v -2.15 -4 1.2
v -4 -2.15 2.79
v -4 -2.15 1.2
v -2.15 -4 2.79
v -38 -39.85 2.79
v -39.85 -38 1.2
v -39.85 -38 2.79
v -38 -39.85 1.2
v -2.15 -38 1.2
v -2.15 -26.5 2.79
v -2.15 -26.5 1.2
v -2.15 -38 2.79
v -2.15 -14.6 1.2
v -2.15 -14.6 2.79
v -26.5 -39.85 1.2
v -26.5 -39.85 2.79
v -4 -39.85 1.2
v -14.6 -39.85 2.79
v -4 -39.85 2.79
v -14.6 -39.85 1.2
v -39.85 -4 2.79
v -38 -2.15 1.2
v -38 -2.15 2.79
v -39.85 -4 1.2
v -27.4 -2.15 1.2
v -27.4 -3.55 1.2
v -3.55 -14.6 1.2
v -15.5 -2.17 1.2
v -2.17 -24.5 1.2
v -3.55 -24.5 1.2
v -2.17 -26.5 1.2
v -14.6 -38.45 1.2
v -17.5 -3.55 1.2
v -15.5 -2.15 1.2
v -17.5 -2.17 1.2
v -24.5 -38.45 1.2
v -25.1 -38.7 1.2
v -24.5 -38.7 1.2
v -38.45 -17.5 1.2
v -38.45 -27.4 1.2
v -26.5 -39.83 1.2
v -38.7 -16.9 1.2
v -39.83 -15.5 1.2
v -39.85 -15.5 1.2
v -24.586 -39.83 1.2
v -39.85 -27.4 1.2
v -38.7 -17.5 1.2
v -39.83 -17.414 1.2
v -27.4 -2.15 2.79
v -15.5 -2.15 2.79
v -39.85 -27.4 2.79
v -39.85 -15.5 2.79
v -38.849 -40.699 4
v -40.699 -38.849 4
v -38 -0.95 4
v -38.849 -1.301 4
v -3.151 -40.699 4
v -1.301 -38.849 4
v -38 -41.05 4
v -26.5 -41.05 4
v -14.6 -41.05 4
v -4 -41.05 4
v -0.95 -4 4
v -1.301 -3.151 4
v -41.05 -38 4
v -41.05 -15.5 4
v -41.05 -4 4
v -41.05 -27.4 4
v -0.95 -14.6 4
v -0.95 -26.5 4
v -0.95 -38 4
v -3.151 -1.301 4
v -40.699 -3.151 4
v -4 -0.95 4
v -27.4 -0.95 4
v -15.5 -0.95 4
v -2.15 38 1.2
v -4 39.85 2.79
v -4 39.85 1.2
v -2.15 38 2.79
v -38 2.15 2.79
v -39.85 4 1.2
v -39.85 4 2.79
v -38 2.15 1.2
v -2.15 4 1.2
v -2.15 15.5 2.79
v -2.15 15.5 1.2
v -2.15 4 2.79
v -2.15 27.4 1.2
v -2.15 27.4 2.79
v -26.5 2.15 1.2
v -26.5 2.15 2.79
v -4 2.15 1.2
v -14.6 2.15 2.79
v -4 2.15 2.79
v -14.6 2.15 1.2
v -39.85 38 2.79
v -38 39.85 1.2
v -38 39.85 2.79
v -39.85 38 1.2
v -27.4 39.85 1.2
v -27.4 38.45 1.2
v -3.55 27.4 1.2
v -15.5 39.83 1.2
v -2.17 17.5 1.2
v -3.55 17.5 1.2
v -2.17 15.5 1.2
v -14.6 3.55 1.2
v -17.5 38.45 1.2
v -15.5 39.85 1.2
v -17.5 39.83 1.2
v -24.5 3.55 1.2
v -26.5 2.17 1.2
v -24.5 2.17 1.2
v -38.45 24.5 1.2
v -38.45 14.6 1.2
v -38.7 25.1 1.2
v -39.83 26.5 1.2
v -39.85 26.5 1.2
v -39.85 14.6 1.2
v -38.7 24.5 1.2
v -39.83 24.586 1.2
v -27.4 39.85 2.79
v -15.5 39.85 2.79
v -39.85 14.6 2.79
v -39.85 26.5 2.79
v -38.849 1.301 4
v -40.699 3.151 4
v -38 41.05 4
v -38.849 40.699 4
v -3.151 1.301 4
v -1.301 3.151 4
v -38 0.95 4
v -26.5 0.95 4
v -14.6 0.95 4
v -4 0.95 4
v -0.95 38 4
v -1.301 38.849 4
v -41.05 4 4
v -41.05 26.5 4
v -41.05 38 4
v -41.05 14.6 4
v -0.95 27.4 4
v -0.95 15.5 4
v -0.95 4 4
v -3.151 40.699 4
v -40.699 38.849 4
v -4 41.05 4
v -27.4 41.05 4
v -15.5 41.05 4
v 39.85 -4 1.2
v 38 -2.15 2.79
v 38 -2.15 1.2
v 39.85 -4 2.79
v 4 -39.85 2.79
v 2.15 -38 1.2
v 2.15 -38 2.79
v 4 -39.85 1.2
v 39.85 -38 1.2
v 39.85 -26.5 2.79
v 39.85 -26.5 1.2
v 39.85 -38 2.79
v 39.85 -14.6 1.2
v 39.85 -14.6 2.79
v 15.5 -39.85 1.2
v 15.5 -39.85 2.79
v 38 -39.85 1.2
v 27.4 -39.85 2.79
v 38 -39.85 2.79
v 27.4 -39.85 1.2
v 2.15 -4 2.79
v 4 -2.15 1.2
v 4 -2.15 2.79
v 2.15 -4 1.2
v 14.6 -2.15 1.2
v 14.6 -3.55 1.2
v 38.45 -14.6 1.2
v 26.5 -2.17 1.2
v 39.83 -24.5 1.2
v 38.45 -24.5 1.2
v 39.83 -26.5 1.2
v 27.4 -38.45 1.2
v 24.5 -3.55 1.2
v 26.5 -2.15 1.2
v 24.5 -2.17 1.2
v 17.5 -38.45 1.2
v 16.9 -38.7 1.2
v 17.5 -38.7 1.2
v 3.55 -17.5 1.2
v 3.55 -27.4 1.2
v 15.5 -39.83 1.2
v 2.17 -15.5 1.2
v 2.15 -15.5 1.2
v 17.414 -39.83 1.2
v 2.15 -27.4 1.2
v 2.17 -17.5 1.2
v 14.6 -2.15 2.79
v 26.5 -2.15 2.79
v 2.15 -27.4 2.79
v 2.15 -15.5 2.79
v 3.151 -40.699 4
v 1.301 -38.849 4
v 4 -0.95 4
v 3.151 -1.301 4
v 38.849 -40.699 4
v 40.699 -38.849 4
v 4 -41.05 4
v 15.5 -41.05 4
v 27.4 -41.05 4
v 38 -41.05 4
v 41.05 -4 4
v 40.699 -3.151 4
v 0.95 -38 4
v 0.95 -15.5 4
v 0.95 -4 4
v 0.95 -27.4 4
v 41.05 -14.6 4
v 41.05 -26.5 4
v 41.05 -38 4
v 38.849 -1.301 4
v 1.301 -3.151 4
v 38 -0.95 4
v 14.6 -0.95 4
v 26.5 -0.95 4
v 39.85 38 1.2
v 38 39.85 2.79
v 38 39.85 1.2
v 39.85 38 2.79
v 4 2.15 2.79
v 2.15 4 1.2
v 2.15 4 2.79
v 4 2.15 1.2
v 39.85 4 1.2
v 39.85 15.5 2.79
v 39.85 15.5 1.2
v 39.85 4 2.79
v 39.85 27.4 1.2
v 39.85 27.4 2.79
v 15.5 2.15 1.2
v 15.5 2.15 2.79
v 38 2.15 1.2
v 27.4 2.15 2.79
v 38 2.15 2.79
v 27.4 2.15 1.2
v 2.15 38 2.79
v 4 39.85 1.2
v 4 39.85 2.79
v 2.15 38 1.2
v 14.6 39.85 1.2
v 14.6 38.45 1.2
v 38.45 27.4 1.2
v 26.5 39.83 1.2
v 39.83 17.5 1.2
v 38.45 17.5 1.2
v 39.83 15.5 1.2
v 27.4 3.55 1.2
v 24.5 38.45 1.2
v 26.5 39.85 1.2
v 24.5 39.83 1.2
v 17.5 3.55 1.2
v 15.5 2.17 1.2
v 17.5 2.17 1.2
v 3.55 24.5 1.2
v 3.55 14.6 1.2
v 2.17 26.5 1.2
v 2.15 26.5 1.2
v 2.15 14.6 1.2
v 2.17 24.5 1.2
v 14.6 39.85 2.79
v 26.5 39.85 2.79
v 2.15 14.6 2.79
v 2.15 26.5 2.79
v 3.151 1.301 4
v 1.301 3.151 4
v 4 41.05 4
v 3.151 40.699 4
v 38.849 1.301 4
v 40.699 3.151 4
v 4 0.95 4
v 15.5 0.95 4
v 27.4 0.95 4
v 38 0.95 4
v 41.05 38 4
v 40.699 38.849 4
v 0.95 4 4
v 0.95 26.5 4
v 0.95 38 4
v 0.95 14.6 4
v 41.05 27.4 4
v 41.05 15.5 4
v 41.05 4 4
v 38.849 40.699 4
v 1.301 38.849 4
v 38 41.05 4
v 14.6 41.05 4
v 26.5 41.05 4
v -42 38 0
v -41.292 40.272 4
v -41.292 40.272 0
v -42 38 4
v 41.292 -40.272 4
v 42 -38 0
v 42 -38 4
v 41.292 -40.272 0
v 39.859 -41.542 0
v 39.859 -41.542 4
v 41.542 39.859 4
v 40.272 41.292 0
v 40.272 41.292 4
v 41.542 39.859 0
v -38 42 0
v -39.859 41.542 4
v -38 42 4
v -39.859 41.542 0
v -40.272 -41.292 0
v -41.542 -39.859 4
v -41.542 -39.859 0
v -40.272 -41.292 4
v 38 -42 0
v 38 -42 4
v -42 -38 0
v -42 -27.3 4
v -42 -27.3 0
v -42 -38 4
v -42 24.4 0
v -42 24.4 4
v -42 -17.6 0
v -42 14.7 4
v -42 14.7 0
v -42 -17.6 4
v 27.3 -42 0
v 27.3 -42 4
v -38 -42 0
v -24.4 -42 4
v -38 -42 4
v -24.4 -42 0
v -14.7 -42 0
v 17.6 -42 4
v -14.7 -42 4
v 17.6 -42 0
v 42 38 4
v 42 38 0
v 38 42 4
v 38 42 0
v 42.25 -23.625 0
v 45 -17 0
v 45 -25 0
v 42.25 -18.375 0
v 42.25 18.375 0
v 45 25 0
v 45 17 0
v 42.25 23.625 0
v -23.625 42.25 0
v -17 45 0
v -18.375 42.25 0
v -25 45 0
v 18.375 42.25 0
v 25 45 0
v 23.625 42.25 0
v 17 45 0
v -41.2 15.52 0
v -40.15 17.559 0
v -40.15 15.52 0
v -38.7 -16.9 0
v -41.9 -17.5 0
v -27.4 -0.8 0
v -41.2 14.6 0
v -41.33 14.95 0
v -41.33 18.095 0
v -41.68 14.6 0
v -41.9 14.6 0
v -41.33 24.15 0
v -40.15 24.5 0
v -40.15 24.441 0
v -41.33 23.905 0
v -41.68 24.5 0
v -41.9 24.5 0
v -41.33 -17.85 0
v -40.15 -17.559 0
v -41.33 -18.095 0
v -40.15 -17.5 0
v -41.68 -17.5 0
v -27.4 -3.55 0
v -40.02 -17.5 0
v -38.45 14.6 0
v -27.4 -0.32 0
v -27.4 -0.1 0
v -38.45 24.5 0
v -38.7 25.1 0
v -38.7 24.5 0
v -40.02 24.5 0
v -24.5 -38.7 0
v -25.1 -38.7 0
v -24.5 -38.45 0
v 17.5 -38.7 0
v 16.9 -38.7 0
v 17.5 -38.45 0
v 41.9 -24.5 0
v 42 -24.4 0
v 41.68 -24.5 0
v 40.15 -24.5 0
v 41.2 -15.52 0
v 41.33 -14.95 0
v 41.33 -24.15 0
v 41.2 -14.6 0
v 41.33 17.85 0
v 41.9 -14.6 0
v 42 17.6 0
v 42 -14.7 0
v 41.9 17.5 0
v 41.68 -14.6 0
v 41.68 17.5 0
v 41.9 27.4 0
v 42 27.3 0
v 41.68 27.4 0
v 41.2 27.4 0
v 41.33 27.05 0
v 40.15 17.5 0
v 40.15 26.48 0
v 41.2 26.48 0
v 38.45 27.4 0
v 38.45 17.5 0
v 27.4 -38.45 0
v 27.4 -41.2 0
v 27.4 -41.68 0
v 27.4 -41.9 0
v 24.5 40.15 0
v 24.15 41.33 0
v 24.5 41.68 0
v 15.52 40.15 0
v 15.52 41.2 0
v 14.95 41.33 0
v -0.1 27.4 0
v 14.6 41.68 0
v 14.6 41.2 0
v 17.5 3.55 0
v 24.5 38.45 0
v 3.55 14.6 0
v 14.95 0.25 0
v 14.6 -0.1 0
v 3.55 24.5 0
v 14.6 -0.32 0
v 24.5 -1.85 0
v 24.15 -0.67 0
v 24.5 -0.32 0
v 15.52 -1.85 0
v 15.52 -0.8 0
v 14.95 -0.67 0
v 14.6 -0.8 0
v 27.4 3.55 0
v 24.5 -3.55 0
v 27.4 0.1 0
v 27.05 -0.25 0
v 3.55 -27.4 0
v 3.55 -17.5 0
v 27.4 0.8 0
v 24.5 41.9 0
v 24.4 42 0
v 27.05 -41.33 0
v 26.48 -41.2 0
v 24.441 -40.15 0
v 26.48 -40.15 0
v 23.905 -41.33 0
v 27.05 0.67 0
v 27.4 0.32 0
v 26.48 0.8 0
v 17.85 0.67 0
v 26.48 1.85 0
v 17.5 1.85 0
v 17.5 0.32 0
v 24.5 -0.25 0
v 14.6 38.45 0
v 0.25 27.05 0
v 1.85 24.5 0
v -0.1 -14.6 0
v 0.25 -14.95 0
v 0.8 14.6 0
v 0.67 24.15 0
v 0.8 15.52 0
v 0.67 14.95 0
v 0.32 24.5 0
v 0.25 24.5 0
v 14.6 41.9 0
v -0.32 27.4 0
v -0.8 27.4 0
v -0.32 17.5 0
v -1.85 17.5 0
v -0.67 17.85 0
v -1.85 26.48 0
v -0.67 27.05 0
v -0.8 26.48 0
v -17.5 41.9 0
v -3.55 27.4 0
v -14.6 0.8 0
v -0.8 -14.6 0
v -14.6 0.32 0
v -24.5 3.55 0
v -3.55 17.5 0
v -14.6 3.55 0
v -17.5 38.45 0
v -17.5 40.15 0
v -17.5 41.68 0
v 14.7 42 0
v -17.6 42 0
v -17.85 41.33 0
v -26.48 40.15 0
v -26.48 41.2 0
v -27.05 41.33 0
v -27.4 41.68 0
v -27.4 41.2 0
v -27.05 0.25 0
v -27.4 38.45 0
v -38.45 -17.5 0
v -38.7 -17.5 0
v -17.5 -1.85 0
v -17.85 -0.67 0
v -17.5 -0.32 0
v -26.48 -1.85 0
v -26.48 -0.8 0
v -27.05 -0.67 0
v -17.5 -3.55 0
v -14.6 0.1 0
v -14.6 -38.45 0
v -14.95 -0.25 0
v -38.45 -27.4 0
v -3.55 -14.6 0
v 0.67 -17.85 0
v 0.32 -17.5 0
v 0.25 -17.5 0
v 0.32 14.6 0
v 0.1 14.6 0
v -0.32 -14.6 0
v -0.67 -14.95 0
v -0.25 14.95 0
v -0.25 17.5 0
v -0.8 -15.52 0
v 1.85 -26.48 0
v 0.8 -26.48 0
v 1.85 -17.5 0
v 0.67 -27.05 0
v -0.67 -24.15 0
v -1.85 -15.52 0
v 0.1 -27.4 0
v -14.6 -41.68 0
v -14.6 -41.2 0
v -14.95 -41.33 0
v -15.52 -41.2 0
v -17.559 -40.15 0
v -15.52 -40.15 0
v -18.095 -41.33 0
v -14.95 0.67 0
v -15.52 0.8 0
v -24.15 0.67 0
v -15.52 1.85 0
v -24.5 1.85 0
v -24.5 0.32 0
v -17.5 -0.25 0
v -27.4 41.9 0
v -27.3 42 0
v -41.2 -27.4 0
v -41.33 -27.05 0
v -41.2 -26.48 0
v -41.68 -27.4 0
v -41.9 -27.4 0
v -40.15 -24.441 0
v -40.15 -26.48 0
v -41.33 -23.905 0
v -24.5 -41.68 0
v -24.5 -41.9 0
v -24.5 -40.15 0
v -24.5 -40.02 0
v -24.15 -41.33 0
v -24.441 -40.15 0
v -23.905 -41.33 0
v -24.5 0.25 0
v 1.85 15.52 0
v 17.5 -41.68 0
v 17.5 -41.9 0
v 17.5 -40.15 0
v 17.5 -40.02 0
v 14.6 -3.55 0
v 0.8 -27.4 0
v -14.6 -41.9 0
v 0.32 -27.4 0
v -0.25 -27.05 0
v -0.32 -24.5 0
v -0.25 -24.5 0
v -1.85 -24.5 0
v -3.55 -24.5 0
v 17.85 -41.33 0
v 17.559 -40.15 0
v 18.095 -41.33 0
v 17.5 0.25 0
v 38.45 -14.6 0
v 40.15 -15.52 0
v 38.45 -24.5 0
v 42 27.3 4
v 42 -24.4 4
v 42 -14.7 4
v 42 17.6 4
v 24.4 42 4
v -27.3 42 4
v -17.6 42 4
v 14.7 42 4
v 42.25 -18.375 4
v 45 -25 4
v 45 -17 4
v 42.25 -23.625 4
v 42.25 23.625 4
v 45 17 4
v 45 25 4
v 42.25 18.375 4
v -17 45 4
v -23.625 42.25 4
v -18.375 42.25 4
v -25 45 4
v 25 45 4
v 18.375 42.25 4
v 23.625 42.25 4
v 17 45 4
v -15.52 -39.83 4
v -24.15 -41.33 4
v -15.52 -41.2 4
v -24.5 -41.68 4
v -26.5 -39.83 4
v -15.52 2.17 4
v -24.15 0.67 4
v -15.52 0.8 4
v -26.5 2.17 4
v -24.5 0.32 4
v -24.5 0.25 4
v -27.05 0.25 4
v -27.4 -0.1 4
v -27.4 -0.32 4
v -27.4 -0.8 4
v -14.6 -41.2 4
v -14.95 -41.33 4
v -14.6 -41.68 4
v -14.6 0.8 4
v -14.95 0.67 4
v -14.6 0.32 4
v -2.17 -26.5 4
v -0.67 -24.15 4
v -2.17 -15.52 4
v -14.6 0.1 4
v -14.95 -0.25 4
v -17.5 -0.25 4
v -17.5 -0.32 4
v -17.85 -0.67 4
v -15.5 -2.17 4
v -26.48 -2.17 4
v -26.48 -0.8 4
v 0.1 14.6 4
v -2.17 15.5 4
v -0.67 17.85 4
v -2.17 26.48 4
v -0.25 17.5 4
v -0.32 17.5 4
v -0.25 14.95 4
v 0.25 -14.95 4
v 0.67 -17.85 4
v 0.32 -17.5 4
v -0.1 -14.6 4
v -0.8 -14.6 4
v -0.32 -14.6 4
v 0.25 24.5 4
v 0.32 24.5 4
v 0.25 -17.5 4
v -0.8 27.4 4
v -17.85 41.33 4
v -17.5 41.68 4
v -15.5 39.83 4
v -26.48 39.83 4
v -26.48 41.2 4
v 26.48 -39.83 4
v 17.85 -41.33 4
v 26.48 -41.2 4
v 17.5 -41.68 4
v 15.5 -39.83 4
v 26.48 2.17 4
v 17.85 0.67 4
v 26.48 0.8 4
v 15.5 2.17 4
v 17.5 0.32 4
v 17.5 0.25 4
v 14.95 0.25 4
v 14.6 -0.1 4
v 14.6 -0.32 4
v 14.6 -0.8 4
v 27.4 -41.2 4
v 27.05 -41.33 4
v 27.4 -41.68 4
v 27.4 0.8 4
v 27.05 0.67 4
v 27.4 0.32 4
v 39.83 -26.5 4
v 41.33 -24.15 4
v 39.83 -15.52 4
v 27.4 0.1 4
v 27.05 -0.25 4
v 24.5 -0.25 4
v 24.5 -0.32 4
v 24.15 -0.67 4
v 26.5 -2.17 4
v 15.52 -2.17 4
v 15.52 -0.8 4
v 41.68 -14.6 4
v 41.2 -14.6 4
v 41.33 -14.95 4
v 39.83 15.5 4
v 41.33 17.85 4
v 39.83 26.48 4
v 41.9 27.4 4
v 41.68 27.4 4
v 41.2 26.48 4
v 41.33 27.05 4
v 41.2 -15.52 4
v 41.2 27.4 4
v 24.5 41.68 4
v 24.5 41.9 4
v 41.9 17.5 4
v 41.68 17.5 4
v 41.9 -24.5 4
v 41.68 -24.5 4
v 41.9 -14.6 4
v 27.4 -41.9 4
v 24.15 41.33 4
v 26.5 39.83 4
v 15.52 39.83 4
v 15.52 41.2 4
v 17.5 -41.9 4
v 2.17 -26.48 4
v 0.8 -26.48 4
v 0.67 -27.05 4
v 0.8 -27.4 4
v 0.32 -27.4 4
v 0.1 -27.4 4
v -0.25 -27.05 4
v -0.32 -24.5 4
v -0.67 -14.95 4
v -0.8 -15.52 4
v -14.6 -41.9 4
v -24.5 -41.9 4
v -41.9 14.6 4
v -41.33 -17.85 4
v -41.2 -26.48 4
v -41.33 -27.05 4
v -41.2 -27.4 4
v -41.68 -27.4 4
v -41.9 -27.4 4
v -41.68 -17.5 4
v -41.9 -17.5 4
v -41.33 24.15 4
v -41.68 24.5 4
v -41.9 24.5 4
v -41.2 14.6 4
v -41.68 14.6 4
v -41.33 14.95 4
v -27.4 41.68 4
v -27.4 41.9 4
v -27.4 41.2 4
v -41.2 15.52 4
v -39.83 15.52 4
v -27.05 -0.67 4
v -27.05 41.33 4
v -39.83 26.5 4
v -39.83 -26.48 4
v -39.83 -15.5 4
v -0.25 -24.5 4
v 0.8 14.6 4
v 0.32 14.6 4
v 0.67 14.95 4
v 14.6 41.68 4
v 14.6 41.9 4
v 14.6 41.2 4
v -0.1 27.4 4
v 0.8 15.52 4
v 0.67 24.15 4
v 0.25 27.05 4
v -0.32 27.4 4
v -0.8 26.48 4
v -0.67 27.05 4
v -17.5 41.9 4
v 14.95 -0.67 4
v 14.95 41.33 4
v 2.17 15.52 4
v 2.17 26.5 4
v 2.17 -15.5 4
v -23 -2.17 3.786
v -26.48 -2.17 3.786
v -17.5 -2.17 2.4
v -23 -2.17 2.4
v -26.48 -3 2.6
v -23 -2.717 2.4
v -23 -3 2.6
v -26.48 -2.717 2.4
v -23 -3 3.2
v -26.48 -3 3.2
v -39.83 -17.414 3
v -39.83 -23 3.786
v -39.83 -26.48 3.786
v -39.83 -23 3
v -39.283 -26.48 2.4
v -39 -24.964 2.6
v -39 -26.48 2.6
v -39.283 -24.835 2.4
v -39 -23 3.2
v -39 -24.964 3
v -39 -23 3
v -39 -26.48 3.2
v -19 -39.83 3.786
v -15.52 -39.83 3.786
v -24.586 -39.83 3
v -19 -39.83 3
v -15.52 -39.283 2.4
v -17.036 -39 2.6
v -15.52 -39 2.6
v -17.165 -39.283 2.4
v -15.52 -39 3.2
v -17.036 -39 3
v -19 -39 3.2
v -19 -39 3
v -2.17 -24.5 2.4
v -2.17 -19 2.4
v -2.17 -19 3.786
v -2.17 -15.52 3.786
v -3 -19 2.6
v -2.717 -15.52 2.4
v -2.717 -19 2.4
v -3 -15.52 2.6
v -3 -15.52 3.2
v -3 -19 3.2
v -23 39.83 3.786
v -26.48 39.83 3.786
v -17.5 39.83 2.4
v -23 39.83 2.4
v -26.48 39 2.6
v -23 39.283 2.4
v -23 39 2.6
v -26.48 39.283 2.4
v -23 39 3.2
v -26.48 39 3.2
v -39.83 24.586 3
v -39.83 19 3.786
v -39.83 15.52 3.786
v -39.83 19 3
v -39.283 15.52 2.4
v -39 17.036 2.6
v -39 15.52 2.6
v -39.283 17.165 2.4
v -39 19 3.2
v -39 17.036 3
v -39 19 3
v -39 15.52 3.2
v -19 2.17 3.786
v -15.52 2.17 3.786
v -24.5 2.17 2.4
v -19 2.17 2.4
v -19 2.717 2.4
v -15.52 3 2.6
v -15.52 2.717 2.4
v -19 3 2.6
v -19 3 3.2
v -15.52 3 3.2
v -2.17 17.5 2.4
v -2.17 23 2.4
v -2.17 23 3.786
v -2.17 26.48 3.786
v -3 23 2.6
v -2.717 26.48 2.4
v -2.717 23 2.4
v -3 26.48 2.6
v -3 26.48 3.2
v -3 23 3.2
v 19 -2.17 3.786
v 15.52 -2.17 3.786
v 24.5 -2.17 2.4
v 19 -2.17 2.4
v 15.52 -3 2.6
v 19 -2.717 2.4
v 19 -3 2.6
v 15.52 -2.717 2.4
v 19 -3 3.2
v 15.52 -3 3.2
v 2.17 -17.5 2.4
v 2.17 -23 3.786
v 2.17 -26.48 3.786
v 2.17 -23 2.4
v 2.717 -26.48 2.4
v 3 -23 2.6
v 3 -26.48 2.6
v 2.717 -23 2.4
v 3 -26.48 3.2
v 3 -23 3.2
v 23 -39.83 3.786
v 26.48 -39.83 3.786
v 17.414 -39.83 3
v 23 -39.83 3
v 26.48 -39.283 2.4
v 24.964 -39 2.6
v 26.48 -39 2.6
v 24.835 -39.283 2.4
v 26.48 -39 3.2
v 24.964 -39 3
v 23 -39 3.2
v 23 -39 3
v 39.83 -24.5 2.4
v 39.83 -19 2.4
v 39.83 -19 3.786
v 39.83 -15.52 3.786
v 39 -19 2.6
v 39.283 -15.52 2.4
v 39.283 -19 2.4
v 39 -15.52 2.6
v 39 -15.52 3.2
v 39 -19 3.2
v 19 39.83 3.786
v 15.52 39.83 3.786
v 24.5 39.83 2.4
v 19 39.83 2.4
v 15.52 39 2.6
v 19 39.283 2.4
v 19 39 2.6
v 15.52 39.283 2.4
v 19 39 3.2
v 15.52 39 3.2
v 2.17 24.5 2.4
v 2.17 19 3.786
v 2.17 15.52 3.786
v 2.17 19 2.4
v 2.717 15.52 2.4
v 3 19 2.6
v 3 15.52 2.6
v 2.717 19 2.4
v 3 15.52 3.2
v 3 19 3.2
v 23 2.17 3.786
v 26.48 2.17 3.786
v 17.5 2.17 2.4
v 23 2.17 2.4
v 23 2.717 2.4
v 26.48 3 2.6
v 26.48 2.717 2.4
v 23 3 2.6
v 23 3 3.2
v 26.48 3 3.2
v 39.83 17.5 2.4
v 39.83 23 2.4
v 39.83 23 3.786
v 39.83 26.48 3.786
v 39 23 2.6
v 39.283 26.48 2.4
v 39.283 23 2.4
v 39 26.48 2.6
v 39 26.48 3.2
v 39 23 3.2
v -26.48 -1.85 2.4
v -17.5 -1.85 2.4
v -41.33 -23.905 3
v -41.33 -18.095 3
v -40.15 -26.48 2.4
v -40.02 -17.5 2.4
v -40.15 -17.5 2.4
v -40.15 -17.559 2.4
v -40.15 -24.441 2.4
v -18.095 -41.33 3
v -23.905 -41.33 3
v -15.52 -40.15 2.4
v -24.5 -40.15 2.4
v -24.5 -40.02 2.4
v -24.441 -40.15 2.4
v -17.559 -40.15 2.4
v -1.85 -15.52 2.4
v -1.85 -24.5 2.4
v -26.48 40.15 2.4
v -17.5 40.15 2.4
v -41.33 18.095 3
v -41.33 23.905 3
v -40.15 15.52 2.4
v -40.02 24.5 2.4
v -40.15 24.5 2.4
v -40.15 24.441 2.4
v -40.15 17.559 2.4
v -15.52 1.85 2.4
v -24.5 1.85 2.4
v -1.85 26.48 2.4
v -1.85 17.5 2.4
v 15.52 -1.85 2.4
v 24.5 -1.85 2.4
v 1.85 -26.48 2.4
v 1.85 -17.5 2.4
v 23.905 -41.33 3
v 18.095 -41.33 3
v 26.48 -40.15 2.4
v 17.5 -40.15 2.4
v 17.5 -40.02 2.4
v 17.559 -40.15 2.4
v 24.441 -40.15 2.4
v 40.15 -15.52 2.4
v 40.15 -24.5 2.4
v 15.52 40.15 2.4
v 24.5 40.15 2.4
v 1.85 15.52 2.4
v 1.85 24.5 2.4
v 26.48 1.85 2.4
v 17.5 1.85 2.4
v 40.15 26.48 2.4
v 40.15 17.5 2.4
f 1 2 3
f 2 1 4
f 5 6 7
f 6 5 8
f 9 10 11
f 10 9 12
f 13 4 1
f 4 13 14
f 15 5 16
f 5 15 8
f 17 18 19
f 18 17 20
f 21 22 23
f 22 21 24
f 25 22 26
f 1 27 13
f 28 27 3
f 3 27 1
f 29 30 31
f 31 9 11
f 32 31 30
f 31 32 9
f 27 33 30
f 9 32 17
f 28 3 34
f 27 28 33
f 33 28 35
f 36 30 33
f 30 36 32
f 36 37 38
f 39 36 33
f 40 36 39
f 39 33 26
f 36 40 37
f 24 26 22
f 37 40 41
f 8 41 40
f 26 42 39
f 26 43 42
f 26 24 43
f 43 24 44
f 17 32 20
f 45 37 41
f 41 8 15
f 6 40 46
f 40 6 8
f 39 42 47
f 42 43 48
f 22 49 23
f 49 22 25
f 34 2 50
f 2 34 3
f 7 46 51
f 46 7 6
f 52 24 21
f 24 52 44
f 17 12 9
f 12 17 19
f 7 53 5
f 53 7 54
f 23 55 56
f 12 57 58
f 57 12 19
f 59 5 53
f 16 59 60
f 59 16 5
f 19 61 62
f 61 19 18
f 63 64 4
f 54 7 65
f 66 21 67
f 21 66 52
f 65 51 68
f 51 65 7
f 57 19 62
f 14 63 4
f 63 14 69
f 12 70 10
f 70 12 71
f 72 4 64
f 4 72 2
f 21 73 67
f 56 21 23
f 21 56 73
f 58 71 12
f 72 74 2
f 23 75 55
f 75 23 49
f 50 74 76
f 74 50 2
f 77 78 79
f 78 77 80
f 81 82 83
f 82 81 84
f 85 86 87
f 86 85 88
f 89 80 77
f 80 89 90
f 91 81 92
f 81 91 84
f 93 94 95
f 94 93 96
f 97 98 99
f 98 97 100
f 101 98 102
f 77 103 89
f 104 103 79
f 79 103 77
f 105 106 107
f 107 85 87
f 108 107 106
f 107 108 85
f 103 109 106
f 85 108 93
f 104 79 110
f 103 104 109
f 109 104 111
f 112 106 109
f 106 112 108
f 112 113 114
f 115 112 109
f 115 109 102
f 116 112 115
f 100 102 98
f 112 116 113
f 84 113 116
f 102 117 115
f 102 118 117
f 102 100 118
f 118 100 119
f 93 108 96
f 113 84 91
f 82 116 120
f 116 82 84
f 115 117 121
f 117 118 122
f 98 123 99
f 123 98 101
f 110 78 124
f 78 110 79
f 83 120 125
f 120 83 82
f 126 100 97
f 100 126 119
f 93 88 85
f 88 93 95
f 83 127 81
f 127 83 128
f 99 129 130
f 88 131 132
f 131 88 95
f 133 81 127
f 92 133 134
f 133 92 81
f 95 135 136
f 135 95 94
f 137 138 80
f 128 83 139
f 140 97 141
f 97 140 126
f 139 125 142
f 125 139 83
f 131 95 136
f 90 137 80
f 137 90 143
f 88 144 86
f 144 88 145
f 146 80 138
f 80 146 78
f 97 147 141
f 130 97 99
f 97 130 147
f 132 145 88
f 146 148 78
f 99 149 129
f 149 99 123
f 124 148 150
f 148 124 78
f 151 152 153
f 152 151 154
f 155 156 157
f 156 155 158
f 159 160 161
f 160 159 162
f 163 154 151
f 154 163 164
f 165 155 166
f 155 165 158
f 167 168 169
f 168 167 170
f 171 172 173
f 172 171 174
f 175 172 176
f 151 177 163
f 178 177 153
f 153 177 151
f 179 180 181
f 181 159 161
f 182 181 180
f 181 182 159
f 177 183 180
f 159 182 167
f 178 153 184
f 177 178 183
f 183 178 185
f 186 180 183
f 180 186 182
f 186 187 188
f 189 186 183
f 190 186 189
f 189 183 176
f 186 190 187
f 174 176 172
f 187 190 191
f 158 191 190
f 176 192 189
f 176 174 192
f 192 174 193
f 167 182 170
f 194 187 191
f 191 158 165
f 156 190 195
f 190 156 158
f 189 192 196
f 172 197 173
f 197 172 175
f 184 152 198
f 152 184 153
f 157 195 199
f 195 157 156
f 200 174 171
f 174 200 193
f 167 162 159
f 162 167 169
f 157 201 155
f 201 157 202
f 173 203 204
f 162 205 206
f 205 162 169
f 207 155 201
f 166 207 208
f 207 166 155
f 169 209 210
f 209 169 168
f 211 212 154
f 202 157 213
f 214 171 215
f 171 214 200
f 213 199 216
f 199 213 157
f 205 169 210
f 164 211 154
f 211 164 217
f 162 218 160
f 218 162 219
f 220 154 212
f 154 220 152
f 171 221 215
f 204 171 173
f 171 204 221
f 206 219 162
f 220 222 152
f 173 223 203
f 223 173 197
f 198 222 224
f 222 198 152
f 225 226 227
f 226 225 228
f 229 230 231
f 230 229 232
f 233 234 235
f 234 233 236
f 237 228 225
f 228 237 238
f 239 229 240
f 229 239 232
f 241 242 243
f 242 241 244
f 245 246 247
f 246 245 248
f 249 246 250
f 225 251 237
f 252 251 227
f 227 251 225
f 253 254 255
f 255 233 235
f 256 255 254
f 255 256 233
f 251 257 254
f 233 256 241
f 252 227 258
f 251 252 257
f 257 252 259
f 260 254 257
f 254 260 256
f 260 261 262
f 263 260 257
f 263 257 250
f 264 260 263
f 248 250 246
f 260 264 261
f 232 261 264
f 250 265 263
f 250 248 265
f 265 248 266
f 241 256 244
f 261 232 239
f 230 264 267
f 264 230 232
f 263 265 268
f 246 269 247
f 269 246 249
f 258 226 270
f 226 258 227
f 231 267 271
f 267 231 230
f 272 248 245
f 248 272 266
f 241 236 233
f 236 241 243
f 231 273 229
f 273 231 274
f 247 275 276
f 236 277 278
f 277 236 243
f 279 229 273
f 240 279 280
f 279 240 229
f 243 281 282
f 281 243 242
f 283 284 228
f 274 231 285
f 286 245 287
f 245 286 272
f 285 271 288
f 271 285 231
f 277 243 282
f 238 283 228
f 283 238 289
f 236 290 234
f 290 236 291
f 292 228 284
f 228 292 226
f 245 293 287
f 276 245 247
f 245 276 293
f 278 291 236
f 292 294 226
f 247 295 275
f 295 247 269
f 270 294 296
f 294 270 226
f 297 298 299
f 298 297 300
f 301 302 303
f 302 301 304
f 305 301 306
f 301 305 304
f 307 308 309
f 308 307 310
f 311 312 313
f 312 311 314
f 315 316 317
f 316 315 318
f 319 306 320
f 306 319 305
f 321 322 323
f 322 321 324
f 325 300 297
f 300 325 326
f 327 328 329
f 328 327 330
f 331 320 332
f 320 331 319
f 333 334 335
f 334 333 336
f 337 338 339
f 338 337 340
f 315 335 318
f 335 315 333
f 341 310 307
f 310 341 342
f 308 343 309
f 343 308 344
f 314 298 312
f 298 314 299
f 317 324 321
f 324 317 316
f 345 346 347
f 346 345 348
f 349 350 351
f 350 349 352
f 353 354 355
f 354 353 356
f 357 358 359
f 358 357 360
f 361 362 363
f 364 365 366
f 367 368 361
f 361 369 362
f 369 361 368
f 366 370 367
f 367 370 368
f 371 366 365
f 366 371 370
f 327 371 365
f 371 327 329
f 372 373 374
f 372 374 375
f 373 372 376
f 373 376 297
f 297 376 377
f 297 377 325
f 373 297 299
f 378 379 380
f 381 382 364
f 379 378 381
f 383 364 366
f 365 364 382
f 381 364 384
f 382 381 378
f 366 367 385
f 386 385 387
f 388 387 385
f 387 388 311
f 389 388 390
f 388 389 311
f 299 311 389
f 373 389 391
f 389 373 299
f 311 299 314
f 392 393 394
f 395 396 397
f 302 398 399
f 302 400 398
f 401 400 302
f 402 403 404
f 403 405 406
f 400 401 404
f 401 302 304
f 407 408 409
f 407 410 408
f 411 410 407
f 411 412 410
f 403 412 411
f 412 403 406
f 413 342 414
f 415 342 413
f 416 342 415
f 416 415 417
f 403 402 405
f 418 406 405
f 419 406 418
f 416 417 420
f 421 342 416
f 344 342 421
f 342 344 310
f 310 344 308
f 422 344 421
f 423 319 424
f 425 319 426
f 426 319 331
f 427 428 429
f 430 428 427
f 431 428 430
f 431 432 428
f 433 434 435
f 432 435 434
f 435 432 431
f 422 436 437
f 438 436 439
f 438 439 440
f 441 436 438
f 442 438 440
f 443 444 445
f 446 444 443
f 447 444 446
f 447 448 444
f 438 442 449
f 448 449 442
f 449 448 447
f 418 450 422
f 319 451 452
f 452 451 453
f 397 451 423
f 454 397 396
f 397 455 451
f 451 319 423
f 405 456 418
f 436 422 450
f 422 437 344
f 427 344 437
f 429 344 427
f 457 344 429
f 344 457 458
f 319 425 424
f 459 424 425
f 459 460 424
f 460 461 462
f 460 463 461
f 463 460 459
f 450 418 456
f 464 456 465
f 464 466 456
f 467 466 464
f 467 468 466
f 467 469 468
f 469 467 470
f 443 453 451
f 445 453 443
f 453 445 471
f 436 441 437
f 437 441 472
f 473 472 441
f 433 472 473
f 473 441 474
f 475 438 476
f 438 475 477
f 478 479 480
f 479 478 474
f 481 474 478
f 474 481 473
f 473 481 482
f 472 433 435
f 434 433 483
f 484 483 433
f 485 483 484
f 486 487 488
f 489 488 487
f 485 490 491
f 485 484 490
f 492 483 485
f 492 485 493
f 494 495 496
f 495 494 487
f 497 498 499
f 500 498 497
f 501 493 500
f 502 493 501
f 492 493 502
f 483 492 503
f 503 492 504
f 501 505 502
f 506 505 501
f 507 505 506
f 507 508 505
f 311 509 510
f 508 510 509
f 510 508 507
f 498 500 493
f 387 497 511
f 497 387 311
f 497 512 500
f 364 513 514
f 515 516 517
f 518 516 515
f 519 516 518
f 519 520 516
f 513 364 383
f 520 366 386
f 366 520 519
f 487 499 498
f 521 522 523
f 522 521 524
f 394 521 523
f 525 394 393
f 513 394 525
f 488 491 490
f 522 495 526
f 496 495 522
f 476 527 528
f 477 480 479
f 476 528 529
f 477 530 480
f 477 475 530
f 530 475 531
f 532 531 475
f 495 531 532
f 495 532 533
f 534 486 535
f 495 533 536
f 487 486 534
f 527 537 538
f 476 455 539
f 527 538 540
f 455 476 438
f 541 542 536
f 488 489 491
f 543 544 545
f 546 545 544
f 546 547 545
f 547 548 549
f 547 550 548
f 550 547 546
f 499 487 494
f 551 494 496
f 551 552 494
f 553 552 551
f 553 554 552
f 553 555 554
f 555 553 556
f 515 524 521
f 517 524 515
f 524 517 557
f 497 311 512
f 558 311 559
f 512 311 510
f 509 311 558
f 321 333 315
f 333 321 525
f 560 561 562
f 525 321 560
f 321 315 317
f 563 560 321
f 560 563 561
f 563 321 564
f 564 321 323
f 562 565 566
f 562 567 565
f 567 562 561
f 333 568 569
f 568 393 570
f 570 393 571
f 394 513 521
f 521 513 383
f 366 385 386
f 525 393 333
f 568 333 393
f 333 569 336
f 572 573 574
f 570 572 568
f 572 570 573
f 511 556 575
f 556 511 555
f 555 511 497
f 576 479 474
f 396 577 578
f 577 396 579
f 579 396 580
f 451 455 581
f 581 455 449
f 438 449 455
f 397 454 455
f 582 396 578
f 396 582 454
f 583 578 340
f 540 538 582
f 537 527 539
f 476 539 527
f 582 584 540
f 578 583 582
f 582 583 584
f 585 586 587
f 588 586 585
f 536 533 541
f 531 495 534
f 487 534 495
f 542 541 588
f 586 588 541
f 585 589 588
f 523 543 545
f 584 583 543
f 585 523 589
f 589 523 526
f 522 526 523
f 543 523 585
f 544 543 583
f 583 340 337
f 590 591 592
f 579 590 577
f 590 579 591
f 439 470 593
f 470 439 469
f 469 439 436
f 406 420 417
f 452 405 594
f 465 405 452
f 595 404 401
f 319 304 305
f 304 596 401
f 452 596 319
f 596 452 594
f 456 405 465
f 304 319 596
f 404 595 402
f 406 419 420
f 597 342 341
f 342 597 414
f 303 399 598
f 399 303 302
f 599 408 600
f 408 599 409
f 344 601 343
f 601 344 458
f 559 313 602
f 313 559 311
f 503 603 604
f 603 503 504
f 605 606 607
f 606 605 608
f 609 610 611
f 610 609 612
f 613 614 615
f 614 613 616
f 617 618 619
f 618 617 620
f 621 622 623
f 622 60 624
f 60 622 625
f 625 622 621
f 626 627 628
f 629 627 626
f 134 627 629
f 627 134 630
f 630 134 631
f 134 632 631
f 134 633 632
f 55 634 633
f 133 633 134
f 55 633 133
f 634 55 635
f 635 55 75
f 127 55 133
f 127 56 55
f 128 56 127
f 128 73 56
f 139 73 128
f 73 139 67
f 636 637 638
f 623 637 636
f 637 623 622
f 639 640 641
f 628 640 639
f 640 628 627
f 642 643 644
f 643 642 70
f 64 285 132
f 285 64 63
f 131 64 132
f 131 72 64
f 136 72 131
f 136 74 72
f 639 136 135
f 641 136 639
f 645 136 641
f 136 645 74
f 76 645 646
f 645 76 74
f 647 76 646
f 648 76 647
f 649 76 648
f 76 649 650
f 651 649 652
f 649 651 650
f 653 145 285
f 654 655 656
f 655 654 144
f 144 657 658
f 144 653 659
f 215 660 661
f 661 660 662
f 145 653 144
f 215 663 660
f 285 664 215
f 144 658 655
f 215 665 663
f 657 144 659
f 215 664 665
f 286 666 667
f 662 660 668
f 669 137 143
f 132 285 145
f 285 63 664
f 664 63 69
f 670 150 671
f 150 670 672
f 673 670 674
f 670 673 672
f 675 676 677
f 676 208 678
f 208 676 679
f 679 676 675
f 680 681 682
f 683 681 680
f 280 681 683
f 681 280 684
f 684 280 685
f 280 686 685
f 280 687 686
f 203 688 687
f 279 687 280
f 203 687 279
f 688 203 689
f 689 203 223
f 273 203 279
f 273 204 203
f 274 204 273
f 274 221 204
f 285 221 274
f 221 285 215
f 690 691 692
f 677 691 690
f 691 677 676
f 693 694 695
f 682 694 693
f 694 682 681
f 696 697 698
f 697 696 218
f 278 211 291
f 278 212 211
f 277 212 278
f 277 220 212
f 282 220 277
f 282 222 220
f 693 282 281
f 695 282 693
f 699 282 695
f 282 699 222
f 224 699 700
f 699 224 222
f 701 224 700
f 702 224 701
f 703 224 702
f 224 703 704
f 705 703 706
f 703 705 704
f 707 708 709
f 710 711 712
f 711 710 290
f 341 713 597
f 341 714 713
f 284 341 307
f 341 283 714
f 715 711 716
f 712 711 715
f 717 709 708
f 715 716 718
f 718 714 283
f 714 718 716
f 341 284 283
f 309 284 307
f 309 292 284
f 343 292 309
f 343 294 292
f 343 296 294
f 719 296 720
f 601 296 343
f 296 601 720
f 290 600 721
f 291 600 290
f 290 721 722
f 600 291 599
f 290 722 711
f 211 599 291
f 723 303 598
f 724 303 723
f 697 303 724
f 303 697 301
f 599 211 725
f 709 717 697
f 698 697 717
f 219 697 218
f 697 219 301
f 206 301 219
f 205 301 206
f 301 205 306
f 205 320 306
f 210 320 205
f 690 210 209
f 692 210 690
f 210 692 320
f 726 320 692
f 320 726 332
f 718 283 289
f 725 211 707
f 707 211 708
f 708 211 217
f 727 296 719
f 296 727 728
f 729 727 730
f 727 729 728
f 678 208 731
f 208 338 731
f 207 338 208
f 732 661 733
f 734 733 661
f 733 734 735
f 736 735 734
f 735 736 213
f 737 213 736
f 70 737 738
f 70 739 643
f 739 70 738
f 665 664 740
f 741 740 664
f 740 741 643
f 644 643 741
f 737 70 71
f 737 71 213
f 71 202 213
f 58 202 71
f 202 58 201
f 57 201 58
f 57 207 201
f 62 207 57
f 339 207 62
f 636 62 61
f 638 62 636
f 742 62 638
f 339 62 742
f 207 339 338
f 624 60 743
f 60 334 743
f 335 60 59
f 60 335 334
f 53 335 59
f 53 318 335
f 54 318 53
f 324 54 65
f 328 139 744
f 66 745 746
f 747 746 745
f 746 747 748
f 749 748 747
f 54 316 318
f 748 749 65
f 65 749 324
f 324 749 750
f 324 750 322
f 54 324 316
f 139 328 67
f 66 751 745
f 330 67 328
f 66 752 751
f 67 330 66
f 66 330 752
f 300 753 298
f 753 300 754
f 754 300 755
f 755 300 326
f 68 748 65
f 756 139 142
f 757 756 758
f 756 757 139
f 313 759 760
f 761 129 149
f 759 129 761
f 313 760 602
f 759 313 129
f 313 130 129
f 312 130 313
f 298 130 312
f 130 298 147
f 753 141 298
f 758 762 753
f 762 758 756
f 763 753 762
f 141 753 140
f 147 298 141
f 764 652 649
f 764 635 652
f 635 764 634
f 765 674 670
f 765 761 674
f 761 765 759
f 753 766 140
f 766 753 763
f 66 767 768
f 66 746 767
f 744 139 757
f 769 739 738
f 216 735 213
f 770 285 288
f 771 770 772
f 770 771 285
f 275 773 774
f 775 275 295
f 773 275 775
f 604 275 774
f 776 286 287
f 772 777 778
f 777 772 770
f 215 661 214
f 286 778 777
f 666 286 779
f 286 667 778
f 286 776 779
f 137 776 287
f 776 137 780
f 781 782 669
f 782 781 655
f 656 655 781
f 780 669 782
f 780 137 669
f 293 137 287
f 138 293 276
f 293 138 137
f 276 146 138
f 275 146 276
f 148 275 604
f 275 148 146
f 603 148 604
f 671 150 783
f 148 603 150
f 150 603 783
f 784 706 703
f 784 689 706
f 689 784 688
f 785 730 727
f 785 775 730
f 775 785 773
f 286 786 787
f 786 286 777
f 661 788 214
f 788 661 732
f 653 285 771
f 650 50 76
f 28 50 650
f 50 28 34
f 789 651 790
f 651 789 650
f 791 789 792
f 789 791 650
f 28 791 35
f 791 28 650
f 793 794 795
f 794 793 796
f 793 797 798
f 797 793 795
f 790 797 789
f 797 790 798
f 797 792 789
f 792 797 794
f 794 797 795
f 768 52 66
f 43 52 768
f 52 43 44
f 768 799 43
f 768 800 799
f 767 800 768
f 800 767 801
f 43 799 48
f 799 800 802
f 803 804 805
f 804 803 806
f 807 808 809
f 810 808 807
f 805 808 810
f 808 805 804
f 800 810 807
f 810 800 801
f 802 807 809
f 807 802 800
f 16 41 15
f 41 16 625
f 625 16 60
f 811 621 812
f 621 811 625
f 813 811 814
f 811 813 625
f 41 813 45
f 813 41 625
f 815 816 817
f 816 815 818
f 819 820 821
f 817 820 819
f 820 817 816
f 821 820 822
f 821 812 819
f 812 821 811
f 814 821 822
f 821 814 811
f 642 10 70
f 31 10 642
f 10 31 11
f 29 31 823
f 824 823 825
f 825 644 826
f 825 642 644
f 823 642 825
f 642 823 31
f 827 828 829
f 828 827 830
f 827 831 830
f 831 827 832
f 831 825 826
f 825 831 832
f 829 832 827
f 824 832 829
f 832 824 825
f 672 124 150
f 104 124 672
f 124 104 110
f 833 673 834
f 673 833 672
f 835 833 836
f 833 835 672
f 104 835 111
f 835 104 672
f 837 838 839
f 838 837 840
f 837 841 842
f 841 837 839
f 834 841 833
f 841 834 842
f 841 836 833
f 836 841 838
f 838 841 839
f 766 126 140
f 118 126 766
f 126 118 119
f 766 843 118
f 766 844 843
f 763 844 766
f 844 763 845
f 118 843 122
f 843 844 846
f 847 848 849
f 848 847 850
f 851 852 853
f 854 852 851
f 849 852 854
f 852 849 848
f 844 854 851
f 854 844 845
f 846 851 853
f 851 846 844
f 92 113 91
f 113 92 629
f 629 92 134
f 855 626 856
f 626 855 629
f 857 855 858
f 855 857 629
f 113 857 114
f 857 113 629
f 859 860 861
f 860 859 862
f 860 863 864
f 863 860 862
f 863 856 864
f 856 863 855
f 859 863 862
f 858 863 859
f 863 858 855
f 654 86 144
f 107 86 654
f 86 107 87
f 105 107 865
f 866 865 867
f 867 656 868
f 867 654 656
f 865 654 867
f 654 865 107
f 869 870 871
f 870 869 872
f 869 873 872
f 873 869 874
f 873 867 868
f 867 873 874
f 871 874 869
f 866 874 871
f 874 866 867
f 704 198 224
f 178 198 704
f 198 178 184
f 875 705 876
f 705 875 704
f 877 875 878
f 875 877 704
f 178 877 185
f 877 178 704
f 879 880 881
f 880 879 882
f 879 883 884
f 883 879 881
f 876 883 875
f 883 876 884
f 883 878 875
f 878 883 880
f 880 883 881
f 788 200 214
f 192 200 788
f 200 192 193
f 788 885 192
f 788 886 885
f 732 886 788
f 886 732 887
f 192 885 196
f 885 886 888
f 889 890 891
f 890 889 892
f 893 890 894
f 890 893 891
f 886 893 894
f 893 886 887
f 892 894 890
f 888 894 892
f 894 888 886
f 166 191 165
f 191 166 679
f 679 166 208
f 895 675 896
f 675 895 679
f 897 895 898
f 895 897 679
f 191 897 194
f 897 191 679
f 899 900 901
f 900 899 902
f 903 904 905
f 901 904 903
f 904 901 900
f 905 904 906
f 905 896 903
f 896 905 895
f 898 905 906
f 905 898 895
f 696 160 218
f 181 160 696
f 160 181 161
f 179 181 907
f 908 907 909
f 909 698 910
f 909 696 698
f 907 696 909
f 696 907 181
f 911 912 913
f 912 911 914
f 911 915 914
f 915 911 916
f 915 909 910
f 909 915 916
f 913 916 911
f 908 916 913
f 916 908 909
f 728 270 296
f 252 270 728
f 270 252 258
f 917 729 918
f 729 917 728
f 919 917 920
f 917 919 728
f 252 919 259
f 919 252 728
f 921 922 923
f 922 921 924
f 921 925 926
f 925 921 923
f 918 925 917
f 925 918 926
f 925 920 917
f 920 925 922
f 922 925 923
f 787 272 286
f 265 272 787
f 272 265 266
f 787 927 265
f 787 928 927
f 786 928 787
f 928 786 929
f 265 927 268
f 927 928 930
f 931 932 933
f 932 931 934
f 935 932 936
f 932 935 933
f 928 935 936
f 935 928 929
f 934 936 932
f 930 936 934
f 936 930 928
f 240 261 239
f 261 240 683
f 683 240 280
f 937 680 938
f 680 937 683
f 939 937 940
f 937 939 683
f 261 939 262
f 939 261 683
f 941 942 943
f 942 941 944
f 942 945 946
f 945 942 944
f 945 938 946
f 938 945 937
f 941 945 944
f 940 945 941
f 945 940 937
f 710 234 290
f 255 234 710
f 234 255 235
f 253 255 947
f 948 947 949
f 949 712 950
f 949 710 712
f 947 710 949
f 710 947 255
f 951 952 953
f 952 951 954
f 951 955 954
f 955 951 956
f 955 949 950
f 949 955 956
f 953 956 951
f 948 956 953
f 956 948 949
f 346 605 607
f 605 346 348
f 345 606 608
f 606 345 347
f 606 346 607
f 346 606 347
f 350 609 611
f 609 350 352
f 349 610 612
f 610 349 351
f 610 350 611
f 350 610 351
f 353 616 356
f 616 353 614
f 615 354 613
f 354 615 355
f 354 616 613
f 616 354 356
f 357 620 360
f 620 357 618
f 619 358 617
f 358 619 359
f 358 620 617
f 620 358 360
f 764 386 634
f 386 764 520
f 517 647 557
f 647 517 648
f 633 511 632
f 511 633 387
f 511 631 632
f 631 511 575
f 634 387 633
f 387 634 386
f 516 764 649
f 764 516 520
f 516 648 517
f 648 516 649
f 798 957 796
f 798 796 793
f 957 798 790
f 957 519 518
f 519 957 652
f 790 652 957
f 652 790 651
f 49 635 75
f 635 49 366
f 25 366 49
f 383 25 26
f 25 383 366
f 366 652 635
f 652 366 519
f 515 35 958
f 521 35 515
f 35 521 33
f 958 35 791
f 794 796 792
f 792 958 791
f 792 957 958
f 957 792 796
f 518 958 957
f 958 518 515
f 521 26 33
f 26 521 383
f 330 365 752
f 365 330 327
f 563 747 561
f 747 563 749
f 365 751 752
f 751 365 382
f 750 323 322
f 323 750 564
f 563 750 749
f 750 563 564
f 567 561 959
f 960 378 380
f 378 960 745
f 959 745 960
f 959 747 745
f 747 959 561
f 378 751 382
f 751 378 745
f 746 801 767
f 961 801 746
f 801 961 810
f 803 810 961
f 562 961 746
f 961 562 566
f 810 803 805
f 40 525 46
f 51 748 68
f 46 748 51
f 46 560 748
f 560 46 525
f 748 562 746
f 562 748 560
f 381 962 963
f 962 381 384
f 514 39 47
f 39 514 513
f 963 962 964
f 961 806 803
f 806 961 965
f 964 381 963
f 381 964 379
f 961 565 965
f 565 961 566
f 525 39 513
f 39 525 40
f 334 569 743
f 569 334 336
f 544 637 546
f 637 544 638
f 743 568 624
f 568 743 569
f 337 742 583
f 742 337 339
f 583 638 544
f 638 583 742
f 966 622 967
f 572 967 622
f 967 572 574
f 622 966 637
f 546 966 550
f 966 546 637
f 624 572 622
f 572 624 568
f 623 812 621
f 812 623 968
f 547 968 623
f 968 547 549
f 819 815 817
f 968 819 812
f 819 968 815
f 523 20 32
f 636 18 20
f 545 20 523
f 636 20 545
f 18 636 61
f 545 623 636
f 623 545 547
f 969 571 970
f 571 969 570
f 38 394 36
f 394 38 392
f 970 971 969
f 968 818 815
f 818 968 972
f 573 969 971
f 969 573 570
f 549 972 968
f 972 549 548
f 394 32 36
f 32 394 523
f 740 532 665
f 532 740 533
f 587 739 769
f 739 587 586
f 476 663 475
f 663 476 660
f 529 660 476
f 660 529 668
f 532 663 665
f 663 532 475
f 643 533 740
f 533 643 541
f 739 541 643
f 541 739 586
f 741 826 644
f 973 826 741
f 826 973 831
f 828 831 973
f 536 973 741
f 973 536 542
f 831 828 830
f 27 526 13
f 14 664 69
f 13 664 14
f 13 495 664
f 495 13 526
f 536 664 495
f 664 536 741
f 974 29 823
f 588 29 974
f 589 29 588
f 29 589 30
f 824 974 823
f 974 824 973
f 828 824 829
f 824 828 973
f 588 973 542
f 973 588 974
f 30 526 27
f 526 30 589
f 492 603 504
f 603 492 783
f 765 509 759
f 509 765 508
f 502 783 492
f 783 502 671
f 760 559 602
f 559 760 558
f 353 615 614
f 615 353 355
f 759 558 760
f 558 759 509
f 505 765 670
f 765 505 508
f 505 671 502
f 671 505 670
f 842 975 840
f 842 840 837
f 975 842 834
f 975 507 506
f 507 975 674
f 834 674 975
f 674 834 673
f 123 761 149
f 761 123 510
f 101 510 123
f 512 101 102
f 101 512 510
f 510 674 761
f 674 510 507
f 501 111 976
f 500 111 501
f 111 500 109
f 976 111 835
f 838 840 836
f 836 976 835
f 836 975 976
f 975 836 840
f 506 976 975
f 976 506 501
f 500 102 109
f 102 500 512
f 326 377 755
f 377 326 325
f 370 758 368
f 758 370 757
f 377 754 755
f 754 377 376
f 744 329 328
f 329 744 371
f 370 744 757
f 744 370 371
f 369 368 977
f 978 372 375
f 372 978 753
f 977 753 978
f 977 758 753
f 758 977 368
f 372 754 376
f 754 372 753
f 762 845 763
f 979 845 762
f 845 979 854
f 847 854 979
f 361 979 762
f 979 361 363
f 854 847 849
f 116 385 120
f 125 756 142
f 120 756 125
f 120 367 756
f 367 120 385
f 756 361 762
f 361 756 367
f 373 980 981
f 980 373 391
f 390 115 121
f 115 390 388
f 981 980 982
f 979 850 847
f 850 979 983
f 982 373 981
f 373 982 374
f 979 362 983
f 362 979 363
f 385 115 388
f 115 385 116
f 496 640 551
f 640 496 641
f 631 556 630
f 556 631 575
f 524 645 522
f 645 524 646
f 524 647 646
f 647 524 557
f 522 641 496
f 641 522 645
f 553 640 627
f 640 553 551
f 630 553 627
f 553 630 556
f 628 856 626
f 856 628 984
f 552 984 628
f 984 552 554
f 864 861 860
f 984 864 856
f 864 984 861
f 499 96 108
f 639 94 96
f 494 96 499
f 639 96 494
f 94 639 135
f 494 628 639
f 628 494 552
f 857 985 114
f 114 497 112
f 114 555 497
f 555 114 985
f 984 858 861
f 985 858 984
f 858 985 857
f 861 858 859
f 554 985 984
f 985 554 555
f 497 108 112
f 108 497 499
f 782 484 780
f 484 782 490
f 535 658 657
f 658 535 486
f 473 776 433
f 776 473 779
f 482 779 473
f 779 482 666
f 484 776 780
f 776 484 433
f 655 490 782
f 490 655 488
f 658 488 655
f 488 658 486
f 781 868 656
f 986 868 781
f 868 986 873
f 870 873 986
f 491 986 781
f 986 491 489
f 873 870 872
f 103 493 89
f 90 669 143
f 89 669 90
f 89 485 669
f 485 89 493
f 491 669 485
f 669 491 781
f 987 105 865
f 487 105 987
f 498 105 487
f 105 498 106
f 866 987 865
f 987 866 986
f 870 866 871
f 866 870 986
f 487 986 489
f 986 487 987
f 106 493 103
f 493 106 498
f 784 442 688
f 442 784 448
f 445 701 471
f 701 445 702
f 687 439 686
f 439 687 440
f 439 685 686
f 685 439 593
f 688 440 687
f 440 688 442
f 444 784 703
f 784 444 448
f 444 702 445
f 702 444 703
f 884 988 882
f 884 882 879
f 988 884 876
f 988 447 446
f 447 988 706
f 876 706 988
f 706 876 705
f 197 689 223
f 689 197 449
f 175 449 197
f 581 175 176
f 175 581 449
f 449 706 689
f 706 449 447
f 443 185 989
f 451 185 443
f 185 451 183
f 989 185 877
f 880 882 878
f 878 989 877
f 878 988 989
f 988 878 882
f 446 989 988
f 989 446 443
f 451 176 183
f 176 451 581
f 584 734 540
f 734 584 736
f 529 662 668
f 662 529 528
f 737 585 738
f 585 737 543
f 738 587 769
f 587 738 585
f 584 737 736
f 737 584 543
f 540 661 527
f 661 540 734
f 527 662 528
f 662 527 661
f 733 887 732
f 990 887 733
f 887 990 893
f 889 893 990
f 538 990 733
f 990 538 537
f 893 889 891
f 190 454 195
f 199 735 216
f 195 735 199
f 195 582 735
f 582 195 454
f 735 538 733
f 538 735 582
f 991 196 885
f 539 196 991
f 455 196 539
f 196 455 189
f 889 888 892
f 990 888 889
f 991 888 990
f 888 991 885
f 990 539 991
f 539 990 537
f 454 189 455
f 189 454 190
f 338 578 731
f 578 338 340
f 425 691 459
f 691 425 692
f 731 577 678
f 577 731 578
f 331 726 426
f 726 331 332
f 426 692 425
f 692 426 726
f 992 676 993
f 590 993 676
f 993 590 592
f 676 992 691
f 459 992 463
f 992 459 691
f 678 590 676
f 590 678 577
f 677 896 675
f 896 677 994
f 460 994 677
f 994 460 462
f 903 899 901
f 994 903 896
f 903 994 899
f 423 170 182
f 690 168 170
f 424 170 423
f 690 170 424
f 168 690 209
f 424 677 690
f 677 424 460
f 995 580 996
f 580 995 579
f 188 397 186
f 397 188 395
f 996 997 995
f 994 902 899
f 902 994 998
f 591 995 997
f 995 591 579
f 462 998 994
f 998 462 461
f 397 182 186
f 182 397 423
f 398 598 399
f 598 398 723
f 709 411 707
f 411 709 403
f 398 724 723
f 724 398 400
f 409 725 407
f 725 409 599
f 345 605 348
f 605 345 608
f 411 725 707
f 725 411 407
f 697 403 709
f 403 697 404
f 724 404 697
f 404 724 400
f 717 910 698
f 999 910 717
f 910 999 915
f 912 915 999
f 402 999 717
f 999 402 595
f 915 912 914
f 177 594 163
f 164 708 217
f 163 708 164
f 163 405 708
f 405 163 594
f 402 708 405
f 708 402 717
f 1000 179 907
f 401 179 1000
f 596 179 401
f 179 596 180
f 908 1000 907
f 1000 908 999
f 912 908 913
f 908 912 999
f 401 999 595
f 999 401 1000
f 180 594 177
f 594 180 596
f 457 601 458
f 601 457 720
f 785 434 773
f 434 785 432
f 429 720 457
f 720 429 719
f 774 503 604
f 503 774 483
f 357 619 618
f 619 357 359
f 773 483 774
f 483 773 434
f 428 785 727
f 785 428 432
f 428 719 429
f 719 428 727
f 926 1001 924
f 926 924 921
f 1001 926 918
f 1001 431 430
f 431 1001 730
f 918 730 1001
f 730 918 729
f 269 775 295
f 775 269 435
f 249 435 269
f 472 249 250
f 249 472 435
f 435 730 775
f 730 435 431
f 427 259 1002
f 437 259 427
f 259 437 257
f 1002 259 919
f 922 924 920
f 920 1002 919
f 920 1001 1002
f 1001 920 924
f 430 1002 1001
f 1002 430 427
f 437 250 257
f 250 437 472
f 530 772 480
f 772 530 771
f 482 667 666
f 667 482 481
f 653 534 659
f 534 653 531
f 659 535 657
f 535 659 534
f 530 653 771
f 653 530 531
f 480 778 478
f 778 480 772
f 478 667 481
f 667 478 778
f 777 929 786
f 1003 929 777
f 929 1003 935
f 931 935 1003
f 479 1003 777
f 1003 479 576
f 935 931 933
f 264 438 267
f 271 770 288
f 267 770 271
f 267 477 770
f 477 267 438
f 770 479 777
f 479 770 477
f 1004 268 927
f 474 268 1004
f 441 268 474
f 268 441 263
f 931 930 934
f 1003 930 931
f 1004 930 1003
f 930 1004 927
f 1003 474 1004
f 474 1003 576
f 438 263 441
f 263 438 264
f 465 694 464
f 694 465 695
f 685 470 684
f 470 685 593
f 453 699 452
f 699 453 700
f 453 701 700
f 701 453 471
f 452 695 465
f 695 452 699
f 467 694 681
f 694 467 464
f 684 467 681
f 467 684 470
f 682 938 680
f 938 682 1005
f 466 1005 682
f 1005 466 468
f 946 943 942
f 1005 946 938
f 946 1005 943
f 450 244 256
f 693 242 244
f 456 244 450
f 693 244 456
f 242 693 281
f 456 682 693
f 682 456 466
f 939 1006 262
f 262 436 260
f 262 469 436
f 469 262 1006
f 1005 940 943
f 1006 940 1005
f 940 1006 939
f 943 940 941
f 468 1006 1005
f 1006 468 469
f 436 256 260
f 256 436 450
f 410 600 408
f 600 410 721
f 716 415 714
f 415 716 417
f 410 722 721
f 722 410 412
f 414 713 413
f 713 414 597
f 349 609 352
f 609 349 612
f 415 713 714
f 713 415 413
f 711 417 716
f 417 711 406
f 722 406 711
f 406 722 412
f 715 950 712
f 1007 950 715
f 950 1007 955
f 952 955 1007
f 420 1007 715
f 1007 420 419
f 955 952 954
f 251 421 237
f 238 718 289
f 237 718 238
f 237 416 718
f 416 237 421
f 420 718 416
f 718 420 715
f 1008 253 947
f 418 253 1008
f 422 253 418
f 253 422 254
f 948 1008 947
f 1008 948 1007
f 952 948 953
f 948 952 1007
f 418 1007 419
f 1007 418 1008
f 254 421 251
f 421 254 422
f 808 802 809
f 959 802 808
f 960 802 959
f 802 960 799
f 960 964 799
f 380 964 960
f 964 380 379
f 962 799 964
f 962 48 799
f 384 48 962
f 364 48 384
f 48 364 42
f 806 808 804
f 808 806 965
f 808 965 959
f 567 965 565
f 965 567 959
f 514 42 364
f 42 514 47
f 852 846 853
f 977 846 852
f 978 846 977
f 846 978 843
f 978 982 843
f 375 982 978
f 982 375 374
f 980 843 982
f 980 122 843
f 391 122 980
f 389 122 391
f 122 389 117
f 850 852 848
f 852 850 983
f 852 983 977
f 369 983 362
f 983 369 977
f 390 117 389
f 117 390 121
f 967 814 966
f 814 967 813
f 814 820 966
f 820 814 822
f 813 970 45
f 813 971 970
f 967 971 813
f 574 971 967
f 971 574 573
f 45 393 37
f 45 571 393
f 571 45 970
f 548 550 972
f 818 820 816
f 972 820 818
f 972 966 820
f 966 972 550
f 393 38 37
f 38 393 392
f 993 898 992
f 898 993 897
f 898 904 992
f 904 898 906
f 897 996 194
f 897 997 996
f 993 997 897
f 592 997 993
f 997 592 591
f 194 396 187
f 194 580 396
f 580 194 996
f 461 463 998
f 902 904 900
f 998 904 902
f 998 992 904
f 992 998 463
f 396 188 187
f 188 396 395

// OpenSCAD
// baseplate_2x2_test — small Clickfinity test tile (JOIN on). PRINT TWO before
// committing to the big plates: (1) click a 1×1 bin in — does the latch hold?
// (2) slide the two tiles together on their shared edge — does the dovetail lock?
// Validates latch clearance + JOIN_CLEAR at ~20 min/tile instead of after 7.5h.
include <../lib/clickfinity.scad>
JOIN = true;
clickfinity_baseplate(2, 2, arms = true);
